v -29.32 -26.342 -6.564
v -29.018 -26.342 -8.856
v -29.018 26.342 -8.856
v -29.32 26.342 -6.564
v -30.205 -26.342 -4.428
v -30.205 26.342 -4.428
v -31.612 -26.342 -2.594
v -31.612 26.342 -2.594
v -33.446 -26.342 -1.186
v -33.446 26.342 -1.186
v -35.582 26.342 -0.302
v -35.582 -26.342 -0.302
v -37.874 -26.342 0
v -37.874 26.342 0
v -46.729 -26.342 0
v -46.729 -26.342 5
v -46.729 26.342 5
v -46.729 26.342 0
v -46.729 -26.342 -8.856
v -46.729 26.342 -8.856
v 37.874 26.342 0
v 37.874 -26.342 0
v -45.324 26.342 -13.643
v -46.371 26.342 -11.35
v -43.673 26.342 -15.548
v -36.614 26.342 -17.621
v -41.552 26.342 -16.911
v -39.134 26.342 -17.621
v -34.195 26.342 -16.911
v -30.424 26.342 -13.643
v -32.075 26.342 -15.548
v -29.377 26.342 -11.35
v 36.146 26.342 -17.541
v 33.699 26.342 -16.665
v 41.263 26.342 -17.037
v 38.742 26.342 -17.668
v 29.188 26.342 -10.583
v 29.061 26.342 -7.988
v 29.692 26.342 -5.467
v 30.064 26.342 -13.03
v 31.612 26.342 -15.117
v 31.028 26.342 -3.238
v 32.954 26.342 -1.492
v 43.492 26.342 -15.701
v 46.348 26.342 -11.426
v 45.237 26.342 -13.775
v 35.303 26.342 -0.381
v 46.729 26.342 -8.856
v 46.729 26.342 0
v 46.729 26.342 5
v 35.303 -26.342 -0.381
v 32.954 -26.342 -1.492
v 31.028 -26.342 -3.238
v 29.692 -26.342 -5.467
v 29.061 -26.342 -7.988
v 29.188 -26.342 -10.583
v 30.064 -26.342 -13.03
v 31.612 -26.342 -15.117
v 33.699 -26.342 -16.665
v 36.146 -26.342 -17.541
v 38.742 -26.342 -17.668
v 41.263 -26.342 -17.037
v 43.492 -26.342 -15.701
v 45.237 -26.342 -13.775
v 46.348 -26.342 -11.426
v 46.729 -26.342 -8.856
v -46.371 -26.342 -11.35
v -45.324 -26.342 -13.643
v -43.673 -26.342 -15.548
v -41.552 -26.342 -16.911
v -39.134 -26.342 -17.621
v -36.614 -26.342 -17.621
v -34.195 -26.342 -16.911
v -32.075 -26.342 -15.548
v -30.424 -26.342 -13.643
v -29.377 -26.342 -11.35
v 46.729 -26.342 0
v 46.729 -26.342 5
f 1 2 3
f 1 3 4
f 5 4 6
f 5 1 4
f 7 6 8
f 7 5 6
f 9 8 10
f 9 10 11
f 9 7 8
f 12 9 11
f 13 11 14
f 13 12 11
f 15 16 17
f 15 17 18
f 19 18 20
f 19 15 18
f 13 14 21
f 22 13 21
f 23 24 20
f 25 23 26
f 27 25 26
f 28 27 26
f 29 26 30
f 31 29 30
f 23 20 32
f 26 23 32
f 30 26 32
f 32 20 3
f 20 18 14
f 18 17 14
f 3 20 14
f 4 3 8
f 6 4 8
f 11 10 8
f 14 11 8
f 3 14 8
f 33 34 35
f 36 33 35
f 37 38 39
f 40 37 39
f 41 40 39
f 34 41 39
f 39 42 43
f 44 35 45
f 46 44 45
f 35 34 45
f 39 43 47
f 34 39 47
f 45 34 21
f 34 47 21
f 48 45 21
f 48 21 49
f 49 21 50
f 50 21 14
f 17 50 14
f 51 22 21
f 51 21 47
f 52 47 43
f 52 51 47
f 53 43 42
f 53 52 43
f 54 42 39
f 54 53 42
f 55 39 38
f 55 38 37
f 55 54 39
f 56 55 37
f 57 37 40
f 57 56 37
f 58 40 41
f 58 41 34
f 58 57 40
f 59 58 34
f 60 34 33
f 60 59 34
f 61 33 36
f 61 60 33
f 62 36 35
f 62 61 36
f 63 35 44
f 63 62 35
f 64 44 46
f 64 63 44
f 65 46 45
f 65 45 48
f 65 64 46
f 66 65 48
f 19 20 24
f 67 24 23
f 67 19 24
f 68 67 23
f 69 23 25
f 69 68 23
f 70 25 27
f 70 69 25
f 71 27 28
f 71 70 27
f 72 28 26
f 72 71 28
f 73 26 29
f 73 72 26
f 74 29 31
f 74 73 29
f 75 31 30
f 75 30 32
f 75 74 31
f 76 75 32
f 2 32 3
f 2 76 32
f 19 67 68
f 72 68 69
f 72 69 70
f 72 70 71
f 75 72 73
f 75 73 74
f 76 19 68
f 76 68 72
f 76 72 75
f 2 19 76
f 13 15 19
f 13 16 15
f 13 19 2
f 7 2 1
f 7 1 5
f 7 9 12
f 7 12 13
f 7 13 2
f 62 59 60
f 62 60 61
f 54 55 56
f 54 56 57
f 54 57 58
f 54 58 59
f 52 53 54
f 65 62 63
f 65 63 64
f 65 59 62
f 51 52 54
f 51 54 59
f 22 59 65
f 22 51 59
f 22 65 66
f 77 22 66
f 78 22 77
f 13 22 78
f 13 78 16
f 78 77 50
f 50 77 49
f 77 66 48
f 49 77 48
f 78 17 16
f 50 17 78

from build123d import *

# Parameters (mm, degrees)
F0_W     = 93.4585928917
F0_H     = 52.6832342148
F1_DEPTH = 5
F3_DEPTH = 52.6832342148


# Not quite as in the source:
# - a feature names something its author has since deleted; it is built from what else it names


with BuildPart() as f1:
    # F0 (on Top) → F1 (new body)
    with BuildSketch(Plane.XY):
        Rectangle(F0_W, F0_H)
    extrude(amount=F1_DEPTH)

    # F2 (on face) → F3 (join, through all)
    with BuildSketch(Plane.XZ.offset(26.3416171074)):
        with BuildLine():
            ThreePointArc((-46.7292964458, -8.8555142283), (-44.1355763793, -2.5937200666), (-37.8737822175, 0))
            Line((-37.8737822175, 0), (-46.7292964458, 0))
            Line((-46.7292964458, 0), (-46.7292964458, -8.8555142283))
        make_face()
        with BuildLine():
            ThreePointArc((46.7292964458, -8.8555142283), (44.1355763793, -2.5937200666), (37.8737822175, 0))
            ThreePointArc((37.8737822175, 0), (31.6119880557, -15.1173083901), (46.7292964458, -8.8555142283))
        make_face()
        with BuildLine():
            ThreePointArc((-46.7292964458, -8.8555142283), (-37.8737822175, -17.7110284567), (-29.0182679892, -8.8555142283))
            ThreePointArc((-29.0182679892, -8.8555142283), (-31.6119880557, -2.5937200666), (-37.8737822175, 0))
            ThreePointArc((-37.8737822175, 0), (-44.1355763793, -2.5937200666), (-46.7292964458, -8.8555142283))
        make_face()
        with BuildLine():
            Line((46.7292964458, 0), (37.8737822175, 0))
            ThreePointArc((37.8737822175, 0), (44.1355763793, -2.5937200666), (46.7292964458, -8.8555142283))
            Line((46.7292964458, -8.8555142283), (46.7292964458, 0))
        make_face()
    extrude(amount=-F3_DEPTH)


solid = f1.part
